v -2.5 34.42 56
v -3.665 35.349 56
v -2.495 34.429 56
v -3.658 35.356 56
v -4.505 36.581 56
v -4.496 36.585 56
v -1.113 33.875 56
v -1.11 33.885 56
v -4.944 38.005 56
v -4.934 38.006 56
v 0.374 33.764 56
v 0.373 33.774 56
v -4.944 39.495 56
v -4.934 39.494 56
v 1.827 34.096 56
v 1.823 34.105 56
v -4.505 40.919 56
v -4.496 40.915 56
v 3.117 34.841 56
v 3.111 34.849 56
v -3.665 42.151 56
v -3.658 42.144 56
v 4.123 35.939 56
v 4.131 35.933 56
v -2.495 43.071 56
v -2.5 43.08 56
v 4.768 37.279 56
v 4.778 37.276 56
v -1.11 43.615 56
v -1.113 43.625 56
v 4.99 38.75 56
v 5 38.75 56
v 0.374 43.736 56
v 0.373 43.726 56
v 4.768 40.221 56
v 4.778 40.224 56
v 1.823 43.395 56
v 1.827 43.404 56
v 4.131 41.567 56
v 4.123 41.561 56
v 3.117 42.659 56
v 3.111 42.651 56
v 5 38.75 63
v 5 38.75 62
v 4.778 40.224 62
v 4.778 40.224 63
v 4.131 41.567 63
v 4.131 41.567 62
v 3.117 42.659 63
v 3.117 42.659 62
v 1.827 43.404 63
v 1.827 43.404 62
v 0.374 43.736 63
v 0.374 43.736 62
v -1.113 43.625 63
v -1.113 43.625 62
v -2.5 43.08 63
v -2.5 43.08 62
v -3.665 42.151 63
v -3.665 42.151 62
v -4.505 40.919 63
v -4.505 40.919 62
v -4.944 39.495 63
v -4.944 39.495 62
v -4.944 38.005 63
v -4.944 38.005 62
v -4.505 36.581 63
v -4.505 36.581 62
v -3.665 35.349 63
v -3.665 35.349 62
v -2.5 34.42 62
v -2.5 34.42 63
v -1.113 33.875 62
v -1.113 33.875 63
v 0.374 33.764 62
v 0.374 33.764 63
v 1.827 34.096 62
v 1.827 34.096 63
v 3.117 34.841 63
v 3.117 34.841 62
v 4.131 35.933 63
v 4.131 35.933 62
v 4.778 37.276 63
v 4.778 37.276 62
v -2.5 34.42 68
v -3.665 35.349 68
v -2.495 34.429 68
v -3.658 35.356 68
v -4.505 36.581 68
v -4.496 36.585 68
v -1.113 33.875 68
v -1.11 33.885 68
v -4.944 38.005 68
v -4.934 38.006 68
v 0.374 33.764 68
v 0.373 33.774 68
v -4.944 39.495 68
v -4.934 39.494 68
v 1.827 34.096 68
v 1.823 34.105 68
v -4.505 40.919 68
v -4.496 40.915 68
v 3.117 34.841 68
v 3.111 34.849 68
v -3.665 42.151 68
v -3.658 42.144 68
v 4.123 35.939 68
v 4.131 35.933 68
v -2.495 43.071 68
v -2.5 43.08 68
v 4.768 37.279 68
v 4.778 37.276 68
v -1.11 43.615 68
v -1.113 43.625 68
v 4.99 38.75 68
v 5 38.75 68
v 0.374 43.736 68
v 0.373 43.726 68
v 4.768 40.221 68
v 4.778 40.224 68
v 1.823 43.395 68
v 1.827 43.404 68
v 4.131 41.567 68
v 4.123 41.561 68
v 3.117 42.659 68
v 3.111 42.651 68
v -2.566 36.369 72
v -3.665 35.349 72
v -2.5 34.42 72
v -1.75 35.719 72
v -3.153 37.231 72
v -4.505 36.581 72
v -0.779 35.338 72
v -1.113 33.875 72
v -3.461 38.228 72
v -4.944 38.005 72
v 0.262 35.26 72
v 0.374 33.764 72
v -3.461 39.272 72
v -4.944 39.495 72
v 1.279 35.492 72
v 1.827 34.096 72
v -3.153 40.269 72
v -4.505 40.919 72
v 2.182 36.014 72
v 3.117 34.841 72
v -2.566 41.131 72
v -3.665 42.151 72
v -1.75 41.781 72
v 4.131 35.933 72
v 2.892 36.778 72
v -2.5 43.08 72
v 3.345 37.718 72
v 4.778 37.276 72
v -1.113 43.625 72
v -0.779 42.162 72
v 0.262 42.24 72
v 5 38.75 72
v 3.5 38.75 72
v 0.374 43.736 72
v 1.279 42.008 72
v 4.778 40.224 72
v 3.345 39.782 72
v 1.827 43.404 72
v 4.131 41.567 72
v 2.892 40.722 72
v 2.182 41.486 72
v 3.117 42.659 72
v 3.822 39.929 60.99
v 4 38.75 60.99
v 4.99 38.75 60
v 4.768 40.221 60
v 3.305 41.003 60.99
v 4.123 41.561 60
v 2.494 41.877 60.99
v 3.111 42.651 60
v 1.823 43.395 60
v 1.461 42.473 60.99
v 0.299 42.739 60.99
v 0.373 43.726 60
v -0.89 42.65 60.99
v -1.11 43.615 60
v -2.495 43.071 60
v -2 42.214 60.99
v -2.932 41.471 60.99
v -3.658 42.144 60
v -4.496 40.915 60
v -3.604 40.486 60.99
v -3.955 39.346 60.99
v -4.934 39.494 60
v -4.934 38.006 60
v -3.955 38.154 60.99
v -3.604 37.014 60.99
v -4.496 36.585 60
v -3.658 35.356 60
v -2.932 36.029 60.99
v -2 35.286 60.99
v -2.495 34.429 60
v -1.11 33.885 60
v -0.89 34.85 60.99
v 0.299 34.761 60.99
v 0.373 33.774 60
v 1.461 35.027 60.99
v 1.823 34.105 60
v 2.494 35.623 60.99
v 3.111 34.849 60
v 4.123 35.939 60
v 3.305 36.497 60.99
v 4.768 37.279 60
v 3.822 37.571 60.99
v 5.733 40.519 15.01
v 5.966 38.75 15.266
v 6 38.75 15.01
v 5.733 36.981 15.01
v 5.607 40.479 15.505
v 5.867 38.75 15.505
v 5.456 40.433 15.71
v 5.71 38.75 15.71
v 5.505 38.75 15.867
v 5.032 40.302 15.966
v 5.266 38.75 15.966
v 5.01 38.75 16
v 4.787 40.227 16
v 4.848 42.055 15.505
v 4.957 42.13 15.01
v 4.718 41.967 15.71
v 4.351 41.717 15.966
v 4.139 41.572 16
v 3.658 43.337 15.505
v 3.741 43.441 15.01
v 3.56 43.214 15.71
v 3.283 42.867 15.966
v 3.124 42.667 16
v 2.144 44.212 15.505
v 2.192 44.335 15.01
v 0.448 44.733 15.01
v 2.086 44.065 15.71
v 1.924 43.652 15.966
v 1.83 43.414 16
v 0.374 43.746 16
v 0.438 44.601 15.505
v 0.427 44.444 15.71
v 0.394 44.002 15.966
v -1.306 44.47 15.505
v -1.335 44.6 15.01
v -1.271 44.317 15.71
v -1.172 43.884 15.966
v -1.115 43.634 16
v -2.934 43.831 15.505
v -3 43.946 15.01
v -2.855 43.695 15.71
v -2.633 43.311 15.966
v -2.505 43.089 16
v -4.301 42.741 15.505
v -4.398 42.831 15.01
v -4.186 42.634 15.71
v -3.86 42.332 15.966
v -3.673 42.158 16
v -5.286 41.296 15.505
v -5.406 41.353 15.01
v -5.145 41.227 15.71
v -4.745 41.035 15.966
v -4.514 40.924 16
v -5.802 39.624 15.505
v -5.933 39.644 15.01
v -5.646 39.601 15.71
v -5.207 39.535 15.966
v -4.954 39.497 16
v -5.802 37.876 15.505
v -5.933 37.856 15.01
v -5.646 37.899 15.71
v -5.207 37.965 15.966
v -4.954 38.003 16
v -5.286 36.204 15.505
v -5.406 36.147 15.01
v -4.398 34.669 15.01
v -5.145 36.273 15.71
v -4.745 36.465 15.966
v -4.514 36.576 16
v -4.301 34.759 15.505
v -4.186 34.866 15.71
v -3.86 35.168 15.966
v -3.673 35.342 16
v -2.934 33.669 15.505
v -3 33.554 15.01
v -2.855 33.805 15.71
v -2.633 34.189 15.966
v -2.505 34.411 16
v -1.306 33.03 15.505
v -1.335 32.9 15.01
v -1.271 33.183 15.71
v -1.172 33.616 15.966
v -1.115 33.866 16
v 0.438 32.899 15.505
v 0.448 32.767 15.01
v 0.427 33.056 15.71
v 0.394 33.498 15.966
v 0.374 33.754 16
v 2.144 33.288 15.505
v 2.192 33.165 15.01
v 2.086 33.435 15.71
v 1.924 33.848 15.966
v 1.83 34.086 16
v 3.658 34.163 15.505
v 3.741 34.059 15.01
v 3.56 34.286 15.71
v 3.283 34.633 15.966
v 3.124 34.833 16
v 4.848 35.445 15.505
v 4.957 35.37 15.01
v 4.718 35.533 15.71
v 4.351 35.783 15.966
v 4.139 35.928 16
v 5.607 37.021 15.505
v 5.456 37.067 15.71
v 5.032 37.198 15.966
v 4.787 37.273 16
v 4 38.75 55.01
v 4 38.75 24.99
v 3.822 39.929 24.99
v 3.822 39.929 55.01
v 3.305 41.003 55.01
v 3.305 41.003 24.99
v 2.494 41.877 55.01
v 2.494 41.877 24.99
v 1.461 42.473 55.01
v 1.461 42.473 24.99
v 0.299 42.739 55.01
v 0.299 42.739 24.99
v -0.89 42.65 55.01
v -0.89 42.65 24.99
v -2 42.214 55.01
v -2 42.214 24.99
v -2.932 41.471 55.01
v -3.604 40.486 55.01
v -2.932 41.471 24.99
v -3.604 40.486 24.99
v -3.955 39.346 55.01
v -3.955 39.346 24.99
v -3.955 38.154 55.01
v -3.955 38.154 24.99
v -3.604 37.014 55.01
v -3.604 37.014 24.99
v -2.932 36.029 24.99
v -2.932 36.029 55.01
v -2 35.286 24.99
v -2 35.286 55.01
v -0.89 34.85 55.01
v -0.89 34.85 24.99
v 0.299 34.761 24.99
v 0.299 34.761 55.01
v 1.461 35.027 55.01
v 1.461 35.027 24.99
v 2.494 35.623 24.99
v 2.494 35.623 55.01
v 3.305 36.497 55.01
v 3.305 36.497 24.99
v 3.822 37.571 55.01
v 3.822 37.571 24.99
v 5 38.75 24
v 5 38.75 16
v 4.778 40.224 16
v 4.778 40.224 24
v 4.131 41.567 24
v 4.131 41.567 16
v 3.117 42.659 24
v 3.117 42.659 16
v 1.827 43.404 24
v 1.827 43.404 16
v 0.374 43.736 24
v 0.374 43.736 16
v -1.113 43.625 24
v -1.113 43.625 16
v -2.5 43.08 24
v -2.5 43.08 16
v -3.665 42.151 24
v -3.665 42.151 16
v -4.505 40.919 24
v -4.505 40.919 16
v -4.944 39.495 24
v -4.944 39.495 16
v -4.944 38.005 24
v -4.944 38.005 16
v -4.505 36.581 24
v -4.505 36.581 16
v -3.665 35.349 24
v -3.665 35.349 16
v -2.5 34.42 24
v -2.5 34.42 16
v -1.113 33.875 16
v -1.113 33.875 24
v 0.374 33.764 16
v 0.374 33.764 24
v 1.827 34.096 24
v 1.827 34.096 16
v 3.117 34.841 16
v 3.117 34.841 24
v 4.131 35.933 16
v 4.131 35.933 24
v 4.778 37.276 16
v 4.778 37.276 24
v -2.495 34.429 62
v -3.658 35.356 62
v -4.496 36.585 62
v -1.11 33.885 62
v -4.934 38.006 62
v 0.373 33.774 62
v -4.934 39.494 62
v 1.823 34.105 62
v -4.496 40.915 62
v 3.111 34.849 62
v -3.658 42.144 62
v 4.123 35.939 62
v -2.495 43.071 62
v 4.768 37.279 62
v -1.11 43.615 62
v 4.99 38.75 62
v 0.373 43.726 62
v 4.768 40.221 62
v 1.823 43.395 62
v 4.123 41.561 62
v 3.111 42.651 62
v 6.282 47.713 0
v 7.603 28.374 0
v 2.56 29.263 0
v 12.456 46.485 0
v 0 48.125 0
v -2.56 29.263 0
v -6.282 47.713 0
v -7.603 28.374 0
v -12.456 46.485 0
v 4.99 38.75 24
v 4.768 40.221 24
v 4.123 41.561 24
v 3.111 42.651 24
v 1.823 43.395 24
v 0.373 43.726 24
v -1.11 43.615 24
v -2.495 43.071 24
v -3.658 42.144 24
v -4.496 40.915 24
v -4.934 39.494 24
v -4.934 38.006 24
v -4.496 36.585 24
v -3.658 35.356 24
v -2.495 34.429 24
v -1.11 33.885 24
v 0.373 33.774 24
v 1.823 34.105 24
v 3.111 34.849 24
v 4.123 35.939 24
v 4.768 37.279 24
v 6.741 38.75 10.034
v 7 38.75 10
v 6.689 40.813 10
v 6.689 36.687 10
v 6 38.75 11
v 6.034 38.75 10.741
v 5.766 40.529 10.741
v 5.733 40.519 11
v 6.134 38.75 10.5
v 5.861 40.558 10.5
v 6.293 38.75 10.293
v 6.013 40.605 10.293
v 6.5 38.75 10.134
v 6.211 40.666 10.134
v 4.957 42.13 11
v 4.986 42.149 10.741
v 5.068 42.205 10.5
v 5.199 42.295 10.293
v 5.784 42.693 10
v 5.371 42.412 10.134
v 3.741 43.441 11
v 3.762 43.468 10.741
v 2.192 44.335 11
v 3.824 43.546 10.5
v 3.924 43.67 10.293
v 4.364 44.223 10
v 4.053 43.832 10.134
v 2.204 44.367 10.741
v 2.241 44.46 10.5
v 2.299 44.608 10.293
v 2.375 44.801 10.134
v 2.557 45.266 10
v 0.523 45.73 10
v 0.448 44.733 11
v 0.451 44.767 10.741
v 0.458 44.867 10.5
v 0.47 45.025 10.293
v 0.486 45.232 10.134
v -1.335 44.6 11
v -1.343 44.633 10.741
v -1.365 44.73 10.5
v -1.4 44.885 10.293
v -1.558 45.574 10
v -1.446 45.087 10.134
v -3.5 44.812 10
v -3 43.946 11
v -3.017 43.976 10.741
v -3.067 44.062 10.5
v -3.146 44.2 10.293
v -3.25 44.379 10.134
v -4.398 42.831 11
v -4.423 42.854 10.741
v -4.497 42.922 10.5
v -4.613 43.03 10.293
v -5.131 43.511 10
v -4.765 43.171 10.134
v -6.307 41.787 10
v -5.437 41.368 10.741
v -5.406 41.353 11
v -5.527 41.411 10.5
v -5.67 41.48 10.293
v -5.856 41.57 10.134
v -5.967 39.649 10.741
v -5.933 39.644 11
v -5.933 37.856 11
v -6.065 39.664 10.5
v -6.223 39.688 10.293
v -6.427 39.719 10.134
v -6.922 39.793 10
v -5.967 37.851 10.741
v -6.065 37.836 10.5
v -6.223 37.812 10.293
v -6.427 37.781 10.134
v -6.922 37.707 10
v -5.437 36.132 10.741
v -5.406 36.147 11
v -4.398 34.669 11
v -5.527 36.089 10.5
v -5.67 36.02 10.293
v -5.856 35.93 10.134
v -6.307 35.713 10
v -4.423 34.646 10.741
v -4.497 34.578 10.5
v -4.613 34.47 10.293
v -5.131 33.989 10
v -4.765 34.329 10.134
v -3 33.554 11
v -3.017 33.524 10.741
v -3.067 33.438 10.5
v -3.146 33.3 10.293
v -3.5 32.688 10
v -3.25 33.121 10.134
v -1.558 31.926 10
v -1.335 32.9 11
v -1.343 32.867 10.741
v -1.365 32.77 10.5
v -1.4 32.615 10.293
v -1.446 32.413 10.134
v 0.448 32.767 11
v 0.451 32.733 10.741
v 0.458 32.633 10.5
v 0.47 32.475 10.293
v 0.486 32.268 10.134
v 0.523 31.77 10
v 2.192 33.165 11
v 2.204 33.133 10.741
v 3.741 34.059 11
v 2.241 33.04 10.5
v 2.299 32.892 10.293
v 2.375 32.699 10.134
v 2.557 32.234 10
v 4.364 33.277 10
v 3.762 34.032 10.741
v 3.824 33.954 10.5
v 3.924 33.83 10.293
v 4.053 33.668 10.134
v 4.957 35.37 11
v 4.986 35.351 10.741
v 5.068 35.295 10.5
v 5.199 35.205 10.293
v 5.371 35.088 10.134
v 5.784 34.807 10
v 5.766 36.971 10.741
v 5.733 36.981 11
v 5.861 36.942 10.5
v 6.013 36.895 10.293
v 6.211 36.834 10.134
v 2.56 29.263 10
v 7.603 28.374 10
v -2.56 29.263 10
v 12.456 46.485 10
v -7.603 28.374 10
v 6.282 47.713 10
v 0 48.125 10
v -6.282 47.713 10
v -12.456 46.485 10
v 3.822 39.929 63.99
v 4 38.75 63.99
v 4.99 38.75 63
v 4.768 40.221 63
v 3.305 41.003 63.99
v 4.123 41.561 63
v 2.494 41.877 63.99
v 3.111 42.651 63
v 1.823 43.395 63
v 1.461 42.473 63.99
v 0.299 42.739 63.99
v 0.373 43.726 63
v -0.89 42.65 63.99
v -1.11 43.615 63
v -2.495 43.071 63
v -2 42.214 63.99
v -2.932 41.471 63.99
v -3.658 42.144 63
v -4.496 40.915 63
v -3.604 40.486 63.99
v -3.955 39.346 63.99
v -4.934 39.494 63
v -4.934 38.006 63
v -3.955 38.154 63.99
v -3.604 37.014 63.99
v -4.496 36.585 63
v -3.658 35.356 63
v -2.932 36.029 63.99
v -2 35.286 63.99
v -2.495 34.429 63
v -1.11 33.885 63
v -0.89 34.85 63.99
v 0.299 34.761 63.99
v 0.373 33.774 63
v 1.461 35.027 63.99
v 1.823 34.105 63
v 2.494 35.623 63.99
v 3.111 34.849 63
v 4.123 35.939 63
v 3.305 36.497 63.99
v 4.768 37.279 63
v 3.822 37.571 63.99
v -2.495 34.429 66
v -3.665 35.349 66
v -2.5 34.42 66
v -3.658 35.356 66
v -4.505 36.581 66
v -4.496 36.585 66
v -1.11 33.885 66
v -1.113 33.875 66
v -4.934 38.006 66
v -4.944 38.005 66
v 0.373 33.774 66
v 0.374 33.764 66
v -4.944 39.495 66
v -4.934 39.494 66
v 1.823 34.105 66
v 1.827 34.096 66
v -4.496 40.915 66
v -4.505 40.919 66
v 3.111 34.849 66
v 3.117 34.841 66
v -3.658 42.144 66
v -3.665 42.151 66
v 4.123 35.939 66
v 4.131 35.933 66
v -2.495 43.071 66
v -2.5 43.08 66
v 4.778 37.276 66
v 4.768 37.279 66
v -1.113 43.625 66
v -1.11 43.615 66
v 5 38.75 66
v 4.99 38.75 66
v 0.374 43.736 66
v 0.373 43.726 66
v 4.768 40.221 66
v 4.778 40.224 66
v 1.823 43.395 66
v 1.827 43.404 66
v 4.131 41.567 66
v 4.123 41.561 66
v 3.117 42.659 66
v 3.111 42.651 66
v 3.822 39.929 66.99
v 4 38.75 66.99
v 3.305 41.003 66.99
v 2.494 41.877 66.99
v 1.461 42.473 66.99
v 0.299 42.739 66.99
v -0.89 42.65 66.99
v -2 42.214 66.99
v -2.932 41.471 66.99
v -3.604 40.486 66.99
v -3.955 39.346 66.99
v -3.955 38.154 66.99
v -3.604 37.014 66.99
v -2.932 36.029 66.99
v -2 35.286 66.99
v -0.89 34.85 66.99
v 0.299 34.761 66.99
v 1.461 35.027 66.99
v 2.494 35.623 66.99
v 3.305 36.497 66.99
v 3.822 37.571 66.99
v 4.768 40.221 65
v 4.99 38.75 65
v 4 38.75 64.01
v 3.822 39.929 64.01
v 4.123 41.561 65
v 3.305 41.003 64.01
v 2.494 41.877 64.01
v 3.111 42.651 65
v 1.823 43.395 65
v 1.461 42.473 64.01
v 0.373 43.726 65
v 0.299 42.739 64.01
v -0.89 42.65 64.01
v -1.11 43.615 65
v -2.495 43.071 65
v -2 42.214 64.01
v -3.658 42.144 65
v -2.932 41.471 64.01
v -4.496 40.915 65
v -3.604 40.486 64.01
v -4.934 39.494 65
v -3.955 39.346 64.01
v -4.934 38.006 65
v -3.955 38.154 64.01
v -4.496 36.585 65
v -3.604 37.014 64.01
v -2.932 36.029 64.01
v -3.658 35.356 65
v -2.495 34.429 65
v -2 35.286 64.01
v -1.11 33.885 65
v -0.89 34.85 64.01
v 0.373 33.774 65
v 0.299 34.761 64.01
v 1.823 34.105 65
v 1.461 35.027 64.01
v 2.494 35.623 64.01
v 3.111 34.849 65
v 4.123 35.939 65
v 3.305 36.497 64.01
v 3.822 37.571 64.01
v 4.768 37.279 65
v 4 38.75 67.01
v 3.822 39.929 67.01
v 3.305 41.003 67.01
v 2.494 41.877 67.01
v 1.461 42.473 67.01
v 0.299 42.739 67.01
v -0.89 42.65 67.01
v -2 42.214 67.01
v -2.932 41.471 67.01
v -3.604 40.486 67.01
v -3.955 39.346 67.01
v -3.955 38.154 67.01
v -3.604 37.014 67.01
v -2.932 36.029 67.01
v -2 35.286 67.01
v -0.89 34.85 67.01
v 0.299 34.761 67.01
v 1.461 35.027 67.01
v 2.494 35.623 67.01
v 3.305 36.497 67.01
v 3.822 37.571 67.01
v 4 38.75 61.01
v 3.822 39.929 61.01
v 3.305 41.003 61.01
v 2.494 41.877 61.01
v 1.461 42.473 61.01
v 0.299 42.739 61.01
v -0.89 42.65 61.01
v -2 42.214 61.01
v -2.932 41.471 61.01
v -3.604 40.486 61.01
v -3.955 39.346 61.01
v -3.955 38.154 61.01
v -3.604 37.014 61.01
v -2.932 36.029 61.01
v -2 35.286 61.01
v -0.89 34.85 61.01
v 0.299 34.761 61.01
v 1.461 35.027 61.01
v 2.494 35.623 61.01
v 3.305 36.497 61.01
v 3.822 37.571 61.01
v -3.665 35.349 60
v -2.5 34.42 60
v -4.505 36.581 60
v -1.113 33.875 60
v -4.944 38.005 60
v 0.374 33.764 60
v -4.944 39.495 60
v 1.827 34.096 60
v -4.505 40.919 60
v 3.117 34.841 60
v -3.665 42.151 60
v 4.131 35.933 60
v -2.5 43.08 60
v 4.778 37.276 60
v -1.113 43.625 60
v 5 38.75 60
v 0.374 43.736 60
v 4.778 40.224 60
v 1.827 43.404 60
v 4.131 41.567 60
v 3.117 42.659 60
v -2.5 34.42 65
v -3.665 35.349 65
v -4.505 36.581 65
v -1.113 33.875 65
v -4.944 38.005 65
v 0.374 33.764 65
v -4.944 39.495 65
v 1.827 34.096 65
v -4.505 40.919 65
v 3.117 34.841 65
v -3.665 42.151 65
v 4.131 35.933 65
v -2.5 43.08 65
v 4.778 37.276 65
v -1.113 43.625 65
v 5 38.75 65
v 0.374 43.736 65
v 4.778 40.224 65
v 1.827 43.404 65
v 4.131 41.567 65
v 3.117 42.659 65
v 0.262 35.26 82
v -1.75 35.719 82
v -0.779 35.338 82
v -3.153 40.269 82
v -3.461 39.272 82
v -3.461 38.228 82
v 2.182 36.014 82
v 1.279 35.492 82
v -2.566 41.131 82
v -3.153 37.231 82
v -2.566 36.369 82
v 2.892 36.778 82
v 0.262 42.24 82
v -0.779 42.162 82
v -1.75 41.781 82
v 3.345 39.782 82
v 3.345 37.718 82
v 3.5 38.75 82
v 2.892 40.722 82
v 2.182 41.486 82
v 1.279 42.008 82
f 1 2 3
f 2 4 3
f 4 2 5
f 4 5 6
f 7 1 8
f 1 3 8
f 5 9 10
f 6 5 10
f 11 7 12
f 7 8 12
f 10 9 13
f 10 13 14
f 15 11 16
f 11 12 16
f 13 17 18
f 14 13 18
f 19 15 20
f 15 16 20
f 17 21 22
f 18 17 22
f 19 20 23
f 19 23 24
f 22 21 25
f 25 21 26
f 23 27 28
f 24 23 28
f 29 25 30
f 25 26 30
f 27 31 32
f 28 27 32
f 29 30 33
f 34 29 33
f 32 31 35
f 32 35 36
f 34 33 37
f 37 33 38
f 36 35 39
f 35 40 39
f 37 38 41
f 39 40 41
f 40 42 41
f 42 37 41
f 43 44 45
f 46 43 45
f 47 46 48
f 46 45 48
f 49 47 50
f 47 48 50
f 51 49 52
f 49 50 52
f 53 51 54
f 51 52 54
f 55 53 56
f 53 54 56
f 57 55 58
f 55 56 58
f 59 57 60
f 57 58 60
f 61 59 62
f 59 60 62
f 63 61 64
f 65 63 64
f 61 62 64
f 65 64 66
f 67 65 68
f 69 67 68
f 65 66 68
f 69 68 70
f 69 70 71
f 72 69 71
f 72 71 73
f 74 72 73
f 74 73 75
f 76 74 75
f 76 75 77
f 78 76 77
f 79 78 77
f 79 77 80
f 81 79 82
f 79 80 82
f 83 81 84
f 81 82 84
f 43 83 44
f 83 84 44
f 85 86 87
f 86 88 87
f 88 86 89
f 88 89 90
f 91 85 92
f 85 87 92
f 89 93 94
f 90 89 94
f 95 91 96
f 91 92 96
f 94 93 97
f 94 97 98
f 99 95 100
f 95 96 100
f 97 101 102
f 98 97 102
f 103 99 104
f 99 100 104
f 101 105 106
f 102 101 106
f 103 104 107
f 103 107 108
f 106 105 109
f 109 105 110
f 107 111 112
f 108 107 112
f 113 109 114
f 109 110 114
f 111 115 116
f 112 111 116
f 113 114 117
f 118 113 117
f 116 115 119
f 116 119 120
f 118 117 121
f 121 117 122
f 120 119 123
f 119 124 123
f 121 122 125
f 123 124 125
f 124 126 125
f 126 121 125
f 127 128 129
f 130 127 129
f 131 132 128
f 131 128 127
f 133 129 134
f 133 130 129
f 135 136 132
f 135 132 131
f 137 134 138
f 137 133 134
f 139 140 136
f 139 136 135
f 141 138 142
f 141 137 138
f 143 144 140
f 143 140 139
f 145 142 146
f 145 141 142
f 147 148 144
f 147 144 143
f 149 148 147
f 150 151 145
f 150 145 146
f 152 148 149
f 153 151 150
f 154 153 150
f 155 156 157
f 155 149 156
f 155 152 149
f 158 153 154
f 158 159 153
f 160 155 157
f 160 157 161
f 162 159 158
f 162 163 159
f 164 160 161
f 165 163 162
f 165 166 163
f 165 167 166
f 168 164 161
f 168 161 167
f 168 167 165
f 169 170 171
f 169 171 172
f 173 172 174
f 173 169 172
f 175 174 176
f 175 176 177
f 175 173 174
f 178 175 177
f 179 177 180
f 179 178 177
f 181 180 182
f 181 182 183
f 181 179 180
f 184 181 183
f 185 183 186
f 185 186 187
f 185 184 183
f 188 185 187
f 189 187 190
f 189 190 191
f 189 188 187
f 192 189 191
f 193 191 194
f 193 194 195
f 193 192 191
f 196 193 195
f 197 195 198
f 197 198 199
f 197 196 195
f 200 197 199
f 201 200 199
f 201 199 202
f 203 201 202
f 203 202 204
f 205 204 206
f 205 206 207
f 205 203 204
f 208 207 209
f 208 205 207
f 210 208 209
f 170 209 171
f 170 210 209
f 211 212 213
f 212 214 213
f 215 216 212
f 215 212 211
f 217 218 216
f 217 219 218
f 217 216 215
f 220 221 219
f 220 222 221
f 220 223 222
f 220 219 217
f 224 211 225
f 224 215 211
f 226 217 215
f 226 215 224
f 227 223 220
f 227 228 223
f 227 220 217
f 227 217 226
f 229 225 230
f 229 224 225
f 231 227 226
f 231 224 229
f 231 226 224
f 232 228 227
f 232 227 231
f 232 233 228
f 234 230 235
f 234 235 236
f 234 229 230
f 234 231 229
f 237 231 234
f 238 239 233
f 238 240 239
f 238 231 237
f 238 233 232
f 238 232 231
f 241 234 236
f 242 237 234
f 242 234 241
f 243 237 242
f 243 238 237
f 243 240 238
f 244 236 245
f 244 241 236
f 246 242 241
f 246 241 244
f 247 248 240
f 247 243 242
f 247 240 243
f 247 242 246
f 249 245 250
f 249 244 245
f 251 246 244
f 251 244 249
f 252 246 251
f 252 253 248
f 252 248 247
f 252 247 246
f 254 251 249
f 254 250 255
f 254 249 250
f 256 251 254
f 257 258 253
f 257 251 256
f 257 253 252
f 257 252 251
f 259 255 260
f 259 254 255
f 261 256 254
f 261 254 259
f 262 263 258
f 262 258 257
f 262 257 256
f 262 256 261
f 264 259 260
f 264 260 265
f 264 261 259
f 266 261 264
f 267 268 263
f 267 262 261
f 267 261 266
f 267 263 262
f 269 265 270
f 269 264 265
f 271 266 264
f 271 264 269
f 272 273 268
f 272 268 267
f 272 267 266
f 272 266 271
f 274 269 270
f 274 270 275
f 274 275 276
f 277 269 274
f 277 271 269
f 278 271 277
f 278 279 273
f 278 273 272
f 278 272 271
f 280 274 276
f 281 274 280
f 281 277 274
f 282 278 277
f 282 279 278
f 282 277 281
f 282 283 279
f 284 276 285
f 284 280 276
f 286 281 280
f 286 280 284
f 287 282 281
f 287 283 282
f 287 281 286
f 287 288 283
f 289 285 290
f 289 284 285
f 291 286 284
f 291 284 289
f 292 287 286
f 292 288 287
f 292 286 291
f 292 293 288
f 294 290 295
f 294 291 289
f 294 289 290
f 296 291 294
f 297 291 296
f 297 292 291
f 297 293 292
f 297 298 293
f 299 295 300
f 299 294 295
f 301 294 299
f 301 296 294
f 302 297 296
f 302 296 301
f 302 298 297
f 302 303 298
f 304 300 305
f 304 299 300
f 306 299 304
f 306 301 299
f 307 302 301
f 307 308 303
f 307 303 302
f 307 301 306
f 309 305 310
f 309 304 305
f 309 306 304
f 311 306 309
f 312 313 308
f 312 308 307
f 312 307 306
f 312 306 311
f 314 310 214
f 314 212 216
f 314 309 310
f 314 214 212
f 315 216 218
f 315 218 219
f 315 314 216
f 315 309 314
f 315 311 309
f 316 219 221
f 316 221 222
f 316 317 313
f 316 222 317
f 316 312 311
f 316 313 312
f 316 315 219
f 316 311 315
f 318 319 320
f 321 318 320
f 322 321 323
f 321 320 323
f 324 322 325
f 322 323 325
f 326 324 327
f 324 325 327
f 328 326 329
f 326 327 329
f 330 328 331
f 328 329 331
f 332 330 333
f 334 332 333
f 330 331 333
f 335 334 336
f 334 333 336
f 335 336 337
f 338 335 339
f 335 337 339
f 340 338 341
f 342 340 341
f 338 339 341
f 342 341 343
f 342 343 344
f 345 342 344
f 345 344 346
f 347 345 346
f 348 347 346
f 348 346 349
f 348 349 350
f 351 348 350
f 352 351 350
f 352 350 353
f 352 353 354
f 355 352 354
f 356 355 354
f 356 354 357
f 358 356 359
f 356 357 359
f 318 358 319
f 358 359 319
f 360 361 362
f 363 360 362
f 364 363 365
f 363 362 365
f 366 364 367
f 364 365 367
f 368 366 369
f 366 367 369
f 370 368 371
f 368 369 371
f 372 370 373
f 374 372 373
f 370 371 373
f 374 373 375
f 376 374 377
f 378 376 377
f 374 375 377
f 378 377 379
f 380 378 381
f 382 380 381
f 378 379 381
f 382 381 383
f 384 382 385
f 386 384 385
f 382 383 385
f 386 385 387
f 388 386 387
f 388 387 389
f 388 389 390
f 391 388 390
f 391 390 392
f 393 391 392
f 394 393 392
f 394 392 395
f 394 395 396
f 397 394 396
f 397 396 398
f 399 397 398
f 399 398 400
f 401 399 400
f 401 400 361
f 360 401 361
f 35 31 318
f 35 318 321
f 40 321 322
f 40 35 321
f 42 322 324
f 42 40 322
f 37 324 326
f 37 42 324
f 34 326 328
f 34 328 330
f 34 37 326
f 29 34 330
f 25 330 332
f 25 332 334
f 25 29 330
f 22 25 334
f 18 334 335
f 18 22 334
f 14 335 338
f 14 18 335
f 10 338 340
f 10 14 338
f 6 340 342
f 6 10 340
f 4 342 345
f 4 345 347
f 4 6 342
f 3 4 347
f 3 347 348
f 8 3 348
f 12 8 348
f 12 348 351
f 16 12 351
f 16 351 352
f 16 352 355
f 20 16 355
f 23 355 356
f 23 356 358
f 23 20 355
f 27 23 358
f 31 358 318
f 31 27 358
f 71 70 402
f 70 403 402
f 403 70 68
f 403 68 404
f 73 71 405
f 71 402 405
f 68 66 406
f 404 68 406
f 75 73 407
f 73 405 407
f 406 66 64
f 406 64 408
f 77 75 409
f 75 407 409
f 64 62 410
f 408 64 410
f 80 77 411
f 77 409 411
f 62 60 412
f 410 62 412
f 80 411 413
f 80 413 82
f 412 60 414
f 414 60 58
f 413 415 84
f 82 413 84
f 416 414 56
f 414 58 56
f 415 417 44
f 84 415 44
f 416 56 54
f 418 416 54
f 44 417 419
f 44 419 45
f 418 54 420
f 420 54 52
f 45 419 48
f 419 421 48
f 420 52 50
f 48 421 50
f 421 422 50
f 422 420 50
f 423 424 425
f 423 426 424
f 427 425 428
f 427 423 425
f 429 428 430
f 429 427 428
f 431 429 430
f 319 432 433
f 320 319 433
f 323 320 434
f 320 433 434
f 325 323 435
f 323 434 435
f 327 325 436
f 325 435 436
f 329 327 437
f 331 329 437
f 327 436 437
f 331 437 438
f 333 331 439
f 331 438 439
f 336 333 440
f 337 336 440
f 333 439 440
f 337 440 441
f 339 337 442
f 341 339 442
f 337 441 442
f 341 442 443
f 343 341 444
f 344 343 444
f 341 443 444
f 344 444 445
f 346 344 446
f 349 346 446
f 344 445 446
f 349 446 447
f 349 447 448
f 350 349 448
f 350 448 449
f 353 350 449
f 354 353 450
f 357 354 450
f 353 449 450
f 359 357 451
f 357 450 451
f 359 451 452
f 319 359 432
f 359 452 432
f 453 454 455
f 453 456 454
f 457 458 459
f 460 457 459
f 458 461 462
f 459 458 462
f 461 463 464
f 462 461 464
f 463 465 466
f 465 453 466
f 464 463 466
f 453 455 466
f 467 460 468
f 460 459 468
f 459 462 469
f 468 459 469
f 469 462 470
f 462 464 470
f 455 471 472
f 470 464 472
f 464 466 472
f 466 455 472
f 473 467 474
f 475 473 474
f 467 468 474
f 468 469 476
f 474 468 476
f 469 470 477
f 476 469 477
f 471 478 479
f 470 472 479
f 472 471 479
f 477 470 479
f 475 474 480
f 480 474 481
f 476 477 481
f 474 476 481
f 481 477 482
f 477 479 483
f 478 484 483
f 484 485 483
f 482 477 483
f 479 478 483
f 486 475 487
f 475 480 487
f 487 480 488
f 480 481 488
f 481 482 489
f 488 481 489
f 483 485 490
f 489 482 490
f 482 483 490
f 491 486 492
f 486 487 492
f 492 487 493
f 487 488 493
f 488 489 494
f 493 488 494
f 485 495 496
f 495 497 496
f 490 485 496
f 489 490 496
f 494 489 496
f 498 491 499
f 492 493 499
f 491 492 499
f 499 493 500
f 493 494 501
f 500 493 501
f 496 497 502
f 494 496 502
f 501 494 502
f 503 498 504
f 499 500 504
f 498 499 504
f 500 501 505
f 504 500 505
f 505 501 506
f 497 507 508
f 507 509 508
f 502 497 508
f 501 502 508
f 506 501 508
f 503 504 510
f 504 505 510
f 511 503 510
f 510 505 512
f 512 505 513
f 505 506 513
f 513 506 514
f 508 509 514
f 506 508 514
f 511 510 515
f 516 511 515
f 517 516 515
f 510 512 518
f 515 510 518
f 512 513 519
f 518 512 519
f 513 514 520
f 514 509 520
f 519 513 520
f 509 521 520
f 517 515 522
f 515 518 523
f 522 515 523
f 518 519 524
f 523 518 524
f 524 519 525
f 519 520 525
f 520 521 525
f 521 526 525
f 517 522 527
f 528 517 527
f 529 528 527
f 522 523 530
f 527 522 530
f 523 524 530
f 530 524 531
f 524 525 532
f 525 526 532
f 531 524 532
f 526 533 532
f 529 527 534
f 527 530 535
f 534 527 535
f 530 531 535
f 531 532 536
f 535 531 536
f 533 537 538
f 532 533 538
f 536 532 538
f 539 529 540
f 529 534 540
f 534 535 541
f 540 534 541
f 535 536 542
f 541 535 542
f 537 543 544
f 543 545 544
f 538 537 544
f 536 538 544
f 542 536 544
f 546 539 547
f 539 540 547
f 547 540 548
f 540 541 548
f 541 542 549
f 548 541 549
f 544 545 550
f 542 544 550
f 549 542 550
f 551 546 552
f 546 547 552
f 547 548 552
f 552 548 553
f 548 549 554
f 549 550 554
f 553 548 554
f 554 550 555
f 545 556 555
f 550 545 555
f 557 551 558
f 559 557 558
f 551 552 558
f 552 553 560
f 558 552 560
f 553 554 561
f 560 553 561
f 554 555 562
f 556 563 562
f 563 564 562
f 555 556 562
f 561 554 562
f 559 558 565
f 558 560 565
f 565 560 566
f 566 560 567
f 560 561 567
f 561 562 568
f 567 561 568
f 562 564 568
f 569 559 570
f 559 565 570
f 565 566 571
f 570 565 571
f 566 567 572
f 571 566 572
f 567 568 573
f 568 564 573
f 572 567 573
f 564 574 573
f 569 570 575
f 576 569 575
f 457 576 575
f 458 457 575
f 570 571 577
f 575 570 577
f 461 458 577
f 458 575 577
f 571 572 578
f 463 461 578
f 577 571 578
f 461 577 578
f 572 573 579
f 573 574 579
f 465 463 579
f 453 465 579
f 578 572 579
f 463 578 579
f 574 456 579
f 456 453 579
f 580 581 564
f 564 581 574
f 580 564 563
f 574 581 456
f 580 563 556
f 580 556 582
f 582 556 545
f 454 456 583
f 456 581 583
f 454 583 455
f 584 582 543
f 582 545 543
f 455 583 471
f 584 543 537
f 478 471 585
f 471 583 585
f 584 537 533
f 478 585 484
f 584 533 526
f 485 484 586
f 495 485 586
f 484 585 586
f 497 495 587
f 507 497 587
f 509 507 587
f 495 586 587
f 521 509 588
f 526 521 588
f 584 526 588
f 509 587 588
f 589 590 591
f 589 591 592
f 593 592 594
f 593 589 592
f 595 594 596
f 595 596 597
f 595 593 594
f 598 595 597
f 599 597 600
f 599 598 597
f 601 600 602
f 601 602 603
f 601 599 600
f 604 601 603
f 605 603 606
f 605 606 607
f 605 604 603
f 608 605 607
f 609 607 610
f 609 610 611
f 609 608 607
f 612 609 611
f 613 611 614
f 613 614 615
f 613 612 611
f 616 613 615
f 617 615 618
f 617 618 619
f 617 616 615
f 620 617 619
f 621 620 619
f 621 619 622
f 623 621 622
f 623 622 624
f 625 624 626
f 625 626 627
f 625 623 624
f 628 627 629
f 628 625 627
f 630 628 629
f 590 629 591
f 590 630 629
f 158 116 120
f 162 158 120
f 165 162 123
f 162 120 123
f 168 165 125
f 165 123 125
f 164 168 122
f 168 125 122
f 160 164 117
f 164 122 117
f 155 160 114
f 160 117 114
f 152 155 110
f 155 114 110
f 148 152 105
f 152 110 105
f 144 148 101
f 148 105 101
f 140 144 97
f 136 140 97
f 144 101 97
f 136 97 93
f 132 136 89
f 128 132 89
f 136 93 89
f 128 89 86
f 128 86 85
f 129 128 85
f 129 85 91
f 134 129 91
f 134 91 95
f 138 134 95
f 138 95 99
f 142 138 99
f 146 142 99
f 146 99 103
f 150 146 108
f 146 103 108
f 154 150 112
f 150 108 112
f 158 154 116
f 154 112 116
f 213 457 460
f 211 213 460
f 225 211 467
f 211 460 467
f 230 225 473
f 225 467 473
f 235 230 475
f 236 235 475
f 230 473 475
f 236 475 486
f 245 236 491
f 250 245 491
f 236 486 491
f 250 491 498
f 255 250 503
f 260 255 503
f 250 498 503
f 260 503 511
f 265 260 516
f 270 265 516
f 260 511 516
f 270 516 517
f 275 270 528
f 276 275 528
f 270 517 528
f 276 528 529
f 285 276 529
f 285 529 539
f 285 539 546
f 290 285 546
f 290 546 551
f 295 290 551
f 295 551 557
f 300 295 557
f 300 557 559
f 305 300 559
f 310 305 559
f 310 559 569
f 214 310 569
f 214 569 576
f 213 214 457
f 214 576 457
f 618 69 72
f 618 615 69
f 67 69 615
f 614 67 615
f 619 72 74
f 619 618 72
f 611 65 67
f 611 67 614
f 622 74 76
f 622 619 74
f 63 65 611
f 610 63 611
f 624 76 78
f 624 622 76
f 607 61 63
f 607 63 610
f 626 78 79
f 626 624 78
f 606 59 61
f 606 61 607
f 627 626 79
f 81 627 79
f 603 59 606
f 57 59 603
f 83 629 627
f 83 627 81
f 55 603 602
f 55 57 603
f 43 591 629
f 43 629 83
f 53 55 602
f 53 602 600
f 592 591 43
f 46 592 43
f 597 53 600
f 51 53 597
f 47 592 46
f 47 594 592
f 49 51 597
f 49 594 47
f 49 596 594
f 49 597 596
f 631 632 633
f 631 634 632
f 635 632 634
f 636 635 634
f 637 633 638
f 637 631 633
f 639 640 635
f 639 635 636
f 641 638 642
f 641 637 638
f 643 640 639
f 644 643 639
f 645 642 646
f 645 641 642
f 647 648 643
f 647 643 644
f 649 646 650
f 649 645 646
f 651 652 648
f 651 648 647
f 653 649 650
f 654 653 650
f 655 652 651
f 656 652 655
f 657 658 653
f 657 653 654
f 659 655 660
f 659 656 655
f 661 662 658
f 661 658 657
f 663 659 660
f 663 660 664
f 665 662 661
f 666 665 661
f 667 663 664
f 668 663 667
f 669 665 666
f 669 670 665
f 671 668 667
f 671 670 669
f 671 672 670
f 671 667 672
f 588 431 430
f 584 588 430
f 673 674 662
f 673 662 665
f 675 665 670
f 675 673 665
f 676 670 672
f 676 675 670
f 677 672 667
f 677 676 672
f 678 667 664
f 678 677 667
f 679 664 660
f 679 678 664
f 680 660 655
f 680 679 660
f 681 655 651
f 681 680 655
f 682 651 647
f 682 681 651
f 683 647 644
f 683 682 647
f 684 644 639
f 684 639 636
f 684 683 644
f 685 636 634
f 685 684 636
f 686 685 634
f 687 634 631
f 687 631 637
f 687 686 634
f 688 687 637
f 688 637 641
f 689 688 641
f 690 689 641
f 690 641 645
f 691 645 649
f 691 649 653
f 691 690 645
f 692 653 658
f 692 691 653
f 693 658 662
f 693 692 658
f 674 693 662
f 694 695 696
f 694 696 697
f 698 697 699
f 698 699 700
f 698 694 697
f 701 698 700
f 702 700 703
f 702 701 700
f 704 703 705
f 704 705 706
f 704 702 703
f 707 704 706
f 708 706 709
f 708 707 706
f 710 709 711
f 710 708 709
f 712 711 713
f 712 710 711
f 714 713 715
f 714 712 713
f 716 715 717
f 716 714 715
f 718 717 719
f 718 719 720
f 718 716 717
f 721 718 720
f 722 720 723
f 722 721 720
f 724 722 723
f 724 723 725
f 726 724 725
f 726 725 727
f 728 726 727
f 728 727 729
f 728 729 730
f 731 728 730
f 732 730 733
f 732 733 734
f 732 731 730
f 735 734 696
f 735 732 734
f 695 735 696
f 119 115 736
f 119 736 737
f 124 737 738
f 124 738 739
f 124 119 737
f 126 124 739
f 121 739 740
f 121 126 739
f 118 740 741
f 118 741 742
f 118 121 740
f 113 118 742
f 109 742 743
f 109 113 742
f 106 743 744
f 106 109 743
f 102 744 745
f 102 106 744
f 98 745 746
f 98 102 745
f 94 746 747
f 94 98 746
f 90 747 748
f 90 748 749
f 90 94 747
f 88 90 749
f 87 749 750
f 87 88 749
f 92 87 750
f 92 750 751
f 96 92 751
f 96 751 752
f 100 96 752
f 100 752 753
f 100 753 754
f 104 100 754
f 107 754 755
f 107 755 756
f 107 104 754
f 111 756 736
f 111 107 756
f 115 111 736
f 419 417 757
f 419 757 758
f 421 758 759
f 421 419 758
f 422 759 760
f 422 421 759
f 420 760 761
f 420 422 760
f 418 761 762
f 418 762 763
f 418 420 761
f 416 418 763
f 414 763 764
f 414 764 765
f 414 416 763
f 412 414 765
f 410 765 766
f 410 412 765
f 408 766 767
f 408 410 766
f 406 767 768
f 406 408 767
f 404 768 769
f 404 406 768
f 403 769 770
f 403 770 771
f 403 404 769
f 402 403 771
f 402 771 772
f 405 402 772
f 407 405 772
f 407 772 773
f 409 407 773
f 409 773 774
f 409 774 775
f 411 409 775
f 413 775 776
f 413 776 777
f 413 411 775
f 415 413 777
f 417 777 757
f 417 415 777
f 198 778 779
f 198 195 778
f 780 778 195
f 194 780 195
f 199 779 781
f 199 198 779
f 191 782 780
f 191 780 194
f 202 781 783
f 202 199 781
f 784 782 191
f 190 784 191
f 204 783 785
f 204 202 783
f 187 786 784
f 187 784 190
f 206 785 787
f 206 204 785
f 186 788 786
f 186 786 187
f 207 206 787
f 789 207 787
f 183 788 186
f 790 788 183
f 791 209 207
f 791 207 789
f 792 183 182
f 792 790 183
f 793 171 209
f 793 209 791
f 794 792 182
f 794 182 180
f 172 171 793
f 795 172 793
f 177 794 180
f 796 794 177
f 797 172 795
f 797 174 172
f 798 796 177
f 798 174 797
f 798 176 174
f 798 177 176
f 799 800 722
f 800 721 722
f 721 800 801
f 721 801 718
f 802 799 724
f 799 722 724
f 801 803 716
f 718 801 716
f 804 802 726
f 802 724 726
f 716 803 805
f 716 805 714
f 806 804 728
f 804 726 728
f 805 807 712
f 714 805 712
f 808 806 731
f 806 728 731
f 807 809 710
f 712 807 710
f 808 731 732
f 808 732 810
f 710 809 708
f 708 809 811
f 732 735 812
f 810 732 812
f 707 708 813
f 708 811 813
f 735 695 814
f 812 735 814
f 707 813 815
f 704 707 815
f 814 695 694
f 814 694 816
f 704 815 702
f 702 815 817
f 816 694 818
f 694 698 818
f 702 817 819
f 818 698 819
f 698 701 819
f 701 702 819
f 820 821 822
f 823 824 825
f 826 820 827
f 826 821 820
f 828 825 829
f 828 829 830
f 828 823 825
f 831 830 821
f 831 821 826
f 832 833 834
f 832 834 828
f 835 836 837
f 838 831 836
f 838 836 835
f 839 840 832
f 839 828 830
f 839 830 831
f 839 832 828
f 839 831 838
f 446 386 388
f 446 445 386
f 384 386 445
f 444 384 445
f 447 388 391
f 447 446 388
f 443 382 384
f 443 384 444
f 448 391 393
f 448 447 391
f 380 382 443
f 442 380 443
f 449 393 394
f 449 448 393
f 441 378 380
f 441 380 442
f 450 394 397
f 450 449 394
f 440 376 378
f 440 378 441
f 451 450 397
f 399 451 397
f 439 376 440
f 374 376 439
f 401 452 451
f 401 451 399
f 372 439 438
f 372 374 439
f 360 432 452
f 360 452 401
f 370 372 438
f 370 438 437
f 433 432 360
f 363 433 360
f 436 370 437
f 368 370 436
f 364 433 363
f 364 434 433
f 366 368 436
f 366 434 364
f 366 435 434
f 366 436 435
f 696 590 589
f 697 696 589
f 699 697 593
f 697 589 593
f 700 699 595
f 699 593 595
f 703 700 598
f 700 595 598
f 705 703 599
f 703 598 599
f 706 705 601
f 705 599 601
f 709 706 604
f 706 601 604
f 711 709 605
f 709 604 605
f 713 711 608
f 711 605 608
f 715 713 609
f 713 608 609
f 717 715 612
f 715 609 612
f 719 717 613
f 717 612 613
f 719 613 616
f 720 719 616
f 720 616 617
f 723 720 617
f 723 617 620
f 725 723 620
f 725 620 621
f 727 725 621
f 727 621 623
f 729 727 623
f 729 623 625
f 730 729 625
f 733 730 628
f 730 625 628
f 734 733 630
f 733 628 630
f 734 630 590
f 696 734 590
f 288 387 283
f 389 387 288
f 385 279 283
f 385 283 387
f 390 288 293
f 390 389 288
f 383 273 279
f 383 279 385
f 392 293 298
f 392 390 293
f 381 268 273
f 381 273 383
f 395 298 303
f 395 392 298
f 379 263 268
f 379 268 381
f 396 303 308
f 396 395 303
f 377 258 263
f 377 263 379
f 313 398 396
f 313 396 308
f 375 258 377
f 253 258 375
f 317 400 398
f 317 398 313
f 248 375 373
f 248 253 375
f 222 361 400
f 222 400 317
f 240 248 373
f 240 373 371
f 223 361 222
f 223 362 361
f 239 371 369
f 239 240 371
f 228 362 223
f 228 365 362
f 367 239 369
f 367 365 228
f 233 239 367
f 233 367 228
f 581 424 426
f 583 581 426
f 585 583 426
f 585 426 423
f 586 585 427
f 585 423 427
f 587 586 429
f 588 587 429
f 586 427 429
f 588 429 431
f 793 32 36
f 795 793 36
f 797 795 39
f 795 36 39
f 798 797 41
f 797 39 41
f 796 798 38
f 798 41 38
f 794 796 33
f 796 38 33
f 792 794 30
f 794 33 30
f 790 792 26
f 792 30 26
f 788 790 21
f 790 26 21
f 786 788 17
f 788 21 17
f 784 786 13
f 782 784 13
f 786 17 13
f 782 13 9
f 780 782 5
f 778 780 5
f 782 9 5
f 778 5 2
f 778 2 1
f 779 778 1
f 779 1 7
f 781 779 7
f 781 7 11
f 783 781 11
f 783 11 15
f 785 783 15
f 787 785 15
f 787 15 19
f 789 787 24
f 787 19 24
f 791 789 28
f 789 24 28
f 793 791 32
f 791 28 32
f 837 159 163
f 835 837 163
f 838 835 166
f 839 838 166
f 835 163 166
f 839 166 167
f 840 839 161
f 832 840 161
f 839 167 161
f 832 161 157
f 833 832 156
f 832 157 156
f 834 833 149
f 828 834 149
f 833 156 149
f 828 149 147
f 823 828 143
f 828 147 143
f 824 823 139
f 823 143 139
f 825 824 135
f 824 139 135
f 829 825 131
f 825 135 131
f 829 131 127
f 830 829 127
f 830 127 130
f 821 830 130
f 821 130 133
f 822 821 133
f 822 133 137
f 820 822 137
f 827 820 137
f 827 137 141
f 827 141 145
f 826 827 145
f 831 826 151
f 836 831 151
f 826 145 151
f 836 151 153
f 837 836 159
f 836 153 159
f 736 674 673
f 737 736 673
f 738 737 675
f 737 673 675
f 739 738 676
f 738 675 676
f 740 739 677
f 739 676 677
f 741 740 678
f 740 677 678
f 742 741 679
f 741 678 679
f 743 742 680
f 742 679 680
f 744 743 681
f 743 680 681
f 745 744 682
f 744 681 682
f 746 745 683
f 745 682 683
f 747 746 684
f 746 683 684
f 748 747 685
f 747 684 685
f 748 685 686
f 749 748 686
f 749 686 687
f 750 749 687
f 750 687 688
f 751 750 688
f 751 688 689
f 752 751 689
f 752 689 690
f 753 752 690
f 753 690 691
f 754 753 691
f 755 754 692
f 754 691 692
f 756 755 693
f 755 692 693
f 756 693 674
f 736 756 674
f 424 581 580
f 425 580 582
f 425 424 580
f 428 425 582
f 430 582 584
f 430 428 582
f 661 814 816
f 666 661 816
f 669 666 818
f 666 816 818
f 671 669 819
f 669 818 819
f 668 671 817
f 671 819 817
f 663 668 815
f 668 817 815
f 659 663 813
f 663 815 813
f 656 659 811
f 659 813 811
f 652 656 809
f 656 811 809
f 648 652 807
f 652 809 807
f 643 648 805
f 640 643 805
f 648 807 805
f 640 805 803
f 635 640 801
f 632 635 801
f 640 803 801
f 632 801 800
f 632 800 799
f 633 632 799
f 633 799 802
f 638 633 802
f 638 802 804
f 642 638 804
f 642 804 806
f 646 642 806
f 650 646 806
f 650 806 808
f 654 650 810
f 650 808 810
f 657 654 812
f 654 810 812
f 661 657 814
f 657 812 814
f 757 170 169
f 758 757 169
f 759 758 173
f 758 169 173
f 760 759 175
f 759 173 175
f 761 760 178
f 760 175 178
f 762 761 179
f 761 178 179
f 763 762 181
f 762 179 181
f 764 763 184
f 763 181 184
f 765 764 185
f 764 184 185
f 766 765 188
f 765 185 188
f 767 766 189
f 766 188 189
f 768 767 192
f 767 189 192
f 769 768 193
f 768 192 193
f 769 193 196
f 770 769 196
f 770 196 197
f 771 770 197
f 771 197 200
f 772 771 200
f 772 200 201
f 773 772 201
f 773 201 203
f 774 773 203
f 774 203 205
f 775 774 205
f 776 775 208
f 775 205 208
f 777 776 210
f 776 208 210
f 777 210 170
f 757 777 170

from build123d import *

# Parameters (mm, degrees)
PAD_DEPTH       = 10
SKETCH002_R     = 5
PAD001_DEPTH    = 14
SKETCH003_R     = 4
PAD002_DEPTH    = 32
SKETCH004_R     = 5
PAD003_DEPTH    = 4
SKETCH005_R     = 4
PAD004_DEPTH    = 2
CHAMFER_SIZE    = 0.99
CHAMFER001_SIZE = 0.99
SKETCH006_R     = 5
PAD005_DEPTH    = 1
SKETCH007_R     = 4
PAD006_DEPTH    = 2
SKETCH008_R     = 5
PAD007_DEPTH    = 1
SKETCH009_R     = 4
PAD008_DEPTH    = 2
SKETCH010_R     = 5
PAD009_DEPTH    = 4
SKETCH011_R     = 6
PAD010_DEPTH    = 6
FILLET_R        = 0.99
FILLET001_R     = 1
SKETCH012_R     = 3.5
PAD011_DEPTH    = 10
CHAMFER002_SIZE = 0.99


with BuildPart() as part:
    # Sketch → Pad (new body)
    with BuildSketch(Plane.XY):
        with BuildLine():
            ThreePointArc((7.602809, 28.374071), (0, 29.375), (-7.602809, 28.374071))
            Line((-12.455667, 46.48518), (-7.602809, 28.374071))
            ThreePointArc((12.455667, 46.48518), (0, 48.125), (-12.455667, 46.48518))
            Line((7.602809, 28.374071), (12.455667, 46.48518))
        make_face()
    extrude(amount=PAD_DEPTH)

    # Sketch002 (on Face6 of Pad) → Pad001 (join)
    with BuildSketch(Plane.XY.offset(10)):
        with Locations((0, 38.75)):
            Circle(SKETCH002_R)
    extrude(amount=PAD001_DEPTH)

    # Sketch003 (on Face8 of Pad001) → Pad002 (join)
    with BuildSketch(Plane.XY.offset(24)):
        with Locations((0, 38.75)):
            Circle(SKETCH003_R)
    extrude(amount=PAD002_DEPTH)

    # Sketch004 (on Face10 of Pad002) → Pad003 (join)
    with BuildSketch(Plane.XY.offset(56)):
        with Locations((0, 38.75)):
            Circle(SKETCH004_R)
    extrude(amount=PAD003_DEPTH)

    # Sketch005 (on Face3 of Pad003) → Pad004 (join)
    with BuildSketch(Plane.XY.offset(60)):
        with Locations((0, 38.75)):
            Circle(SKETCH005_R)
    extrude(amount=PAD004_DEPTH)

    # Chamfer
    chamfer_edges = [part.edges().sort_by_distance(p)[0] for p in [
        (-4, 38.75, 24),
    ]]
    chamfer(chamfer_edges, length=CHAMFER_SIZE)

    # Chamfer001
    chamfer001_edges = [part.edges().sort_by_distance(p)[0] for p in [
        (-4, 38.75, 56),
    ]]
    chamfer(chamfer001_edges, length=CHAMFER001_SIZE)

    # Sketch006 (on Face15 of Chamfer001) → Pad005 (join)
    with BuildSketch(Plane.XY.offset(62)):
        with Locations((0, 38.75)):
            Circle(SKETCH006_R)
    extrude(amount=PAD005_DEPTH)

    # Sketch007 (on Face3 of Pad005) → Pad006 (join)
    with BuildSketch(Plane.XY.offset(63)):
        with Locations((0, 38.75)):
            Circle(SKETCH007_R)
    extrude(amount=PAD006_DEPTH)

    # Sketch008 (on Face7 of Pad006) → Pad007 (join)
    with BuildSketch(Plane.XY.offset(65)):
        with Locations((0, 38.75)):
            Circle(SKETCH008_R)
    extrude(amount=PAD007_DEPTH)

    # Sketch009 (on Face3 of Pad007) → Pad008 (join)
    with BuildSketch(Plane.XY.offset(66)):
        with Locations((0, 38.75)):
            Circle(SKETCH009_R)
    extrude(amount=PAD008_DEPTH)

    # Sketch010 (on Face7 of Pad008) → Pad009 (join)
    with BuildSketch(Plane.XY.offset(68)):
        with Locations((0, 38.75)):
            Circle(SKETCH010_R)
    extrude(amount=PAD009_DEPTH)

    # Sketch011 (on Face21 of Pad009) → Pad010 (join)
    with BuildSketch(Plane.XY.offset(10)):
        with Locations((0, 38.75)):
            Circle(SKETCH011_R)
    extrude(amount=PAD010_DEPTH)

    # Fillet
    fillet_edges = [part.edges().sort_by_distance(p)[0] for p in [
        (-6, 38.75, 16),
    ]]
    fillet(fillet_edges, radius=FILLET_R)

    # Fillet001
    fillet001_edges = [part.edges().sort_by_distance(p)[0] for p in [
        (-6, 38.75, 10),
    ]]
    fillet(fillet001_edges, radius=FILLET001_R)

    # Sketch012 (on Face30 of Fillet001) → Pad011 (join)
    with BuildSketch(Plane.XY.offset(72)):
        with Locations((0, 38.75)):
            Circle(SKETCH012_R)
    extrude(amount=PAD011_DEPTH)

    # Chamfer002
    chamfer002_edges = [part.edges().sort_by_distance(p)[0] for p in [
        (-4, 38.75, 68),
        (-4, 38.75, 65),
        (-4, 38.75, 62),
        (-4, 38.75, 66),
        (-4, 38.75, 63),
        (-4, 38.75, 60),
    ]]
    chamfer(chamfer002_edges, length=CHAMFER002_SIZE)


solid = part.part
